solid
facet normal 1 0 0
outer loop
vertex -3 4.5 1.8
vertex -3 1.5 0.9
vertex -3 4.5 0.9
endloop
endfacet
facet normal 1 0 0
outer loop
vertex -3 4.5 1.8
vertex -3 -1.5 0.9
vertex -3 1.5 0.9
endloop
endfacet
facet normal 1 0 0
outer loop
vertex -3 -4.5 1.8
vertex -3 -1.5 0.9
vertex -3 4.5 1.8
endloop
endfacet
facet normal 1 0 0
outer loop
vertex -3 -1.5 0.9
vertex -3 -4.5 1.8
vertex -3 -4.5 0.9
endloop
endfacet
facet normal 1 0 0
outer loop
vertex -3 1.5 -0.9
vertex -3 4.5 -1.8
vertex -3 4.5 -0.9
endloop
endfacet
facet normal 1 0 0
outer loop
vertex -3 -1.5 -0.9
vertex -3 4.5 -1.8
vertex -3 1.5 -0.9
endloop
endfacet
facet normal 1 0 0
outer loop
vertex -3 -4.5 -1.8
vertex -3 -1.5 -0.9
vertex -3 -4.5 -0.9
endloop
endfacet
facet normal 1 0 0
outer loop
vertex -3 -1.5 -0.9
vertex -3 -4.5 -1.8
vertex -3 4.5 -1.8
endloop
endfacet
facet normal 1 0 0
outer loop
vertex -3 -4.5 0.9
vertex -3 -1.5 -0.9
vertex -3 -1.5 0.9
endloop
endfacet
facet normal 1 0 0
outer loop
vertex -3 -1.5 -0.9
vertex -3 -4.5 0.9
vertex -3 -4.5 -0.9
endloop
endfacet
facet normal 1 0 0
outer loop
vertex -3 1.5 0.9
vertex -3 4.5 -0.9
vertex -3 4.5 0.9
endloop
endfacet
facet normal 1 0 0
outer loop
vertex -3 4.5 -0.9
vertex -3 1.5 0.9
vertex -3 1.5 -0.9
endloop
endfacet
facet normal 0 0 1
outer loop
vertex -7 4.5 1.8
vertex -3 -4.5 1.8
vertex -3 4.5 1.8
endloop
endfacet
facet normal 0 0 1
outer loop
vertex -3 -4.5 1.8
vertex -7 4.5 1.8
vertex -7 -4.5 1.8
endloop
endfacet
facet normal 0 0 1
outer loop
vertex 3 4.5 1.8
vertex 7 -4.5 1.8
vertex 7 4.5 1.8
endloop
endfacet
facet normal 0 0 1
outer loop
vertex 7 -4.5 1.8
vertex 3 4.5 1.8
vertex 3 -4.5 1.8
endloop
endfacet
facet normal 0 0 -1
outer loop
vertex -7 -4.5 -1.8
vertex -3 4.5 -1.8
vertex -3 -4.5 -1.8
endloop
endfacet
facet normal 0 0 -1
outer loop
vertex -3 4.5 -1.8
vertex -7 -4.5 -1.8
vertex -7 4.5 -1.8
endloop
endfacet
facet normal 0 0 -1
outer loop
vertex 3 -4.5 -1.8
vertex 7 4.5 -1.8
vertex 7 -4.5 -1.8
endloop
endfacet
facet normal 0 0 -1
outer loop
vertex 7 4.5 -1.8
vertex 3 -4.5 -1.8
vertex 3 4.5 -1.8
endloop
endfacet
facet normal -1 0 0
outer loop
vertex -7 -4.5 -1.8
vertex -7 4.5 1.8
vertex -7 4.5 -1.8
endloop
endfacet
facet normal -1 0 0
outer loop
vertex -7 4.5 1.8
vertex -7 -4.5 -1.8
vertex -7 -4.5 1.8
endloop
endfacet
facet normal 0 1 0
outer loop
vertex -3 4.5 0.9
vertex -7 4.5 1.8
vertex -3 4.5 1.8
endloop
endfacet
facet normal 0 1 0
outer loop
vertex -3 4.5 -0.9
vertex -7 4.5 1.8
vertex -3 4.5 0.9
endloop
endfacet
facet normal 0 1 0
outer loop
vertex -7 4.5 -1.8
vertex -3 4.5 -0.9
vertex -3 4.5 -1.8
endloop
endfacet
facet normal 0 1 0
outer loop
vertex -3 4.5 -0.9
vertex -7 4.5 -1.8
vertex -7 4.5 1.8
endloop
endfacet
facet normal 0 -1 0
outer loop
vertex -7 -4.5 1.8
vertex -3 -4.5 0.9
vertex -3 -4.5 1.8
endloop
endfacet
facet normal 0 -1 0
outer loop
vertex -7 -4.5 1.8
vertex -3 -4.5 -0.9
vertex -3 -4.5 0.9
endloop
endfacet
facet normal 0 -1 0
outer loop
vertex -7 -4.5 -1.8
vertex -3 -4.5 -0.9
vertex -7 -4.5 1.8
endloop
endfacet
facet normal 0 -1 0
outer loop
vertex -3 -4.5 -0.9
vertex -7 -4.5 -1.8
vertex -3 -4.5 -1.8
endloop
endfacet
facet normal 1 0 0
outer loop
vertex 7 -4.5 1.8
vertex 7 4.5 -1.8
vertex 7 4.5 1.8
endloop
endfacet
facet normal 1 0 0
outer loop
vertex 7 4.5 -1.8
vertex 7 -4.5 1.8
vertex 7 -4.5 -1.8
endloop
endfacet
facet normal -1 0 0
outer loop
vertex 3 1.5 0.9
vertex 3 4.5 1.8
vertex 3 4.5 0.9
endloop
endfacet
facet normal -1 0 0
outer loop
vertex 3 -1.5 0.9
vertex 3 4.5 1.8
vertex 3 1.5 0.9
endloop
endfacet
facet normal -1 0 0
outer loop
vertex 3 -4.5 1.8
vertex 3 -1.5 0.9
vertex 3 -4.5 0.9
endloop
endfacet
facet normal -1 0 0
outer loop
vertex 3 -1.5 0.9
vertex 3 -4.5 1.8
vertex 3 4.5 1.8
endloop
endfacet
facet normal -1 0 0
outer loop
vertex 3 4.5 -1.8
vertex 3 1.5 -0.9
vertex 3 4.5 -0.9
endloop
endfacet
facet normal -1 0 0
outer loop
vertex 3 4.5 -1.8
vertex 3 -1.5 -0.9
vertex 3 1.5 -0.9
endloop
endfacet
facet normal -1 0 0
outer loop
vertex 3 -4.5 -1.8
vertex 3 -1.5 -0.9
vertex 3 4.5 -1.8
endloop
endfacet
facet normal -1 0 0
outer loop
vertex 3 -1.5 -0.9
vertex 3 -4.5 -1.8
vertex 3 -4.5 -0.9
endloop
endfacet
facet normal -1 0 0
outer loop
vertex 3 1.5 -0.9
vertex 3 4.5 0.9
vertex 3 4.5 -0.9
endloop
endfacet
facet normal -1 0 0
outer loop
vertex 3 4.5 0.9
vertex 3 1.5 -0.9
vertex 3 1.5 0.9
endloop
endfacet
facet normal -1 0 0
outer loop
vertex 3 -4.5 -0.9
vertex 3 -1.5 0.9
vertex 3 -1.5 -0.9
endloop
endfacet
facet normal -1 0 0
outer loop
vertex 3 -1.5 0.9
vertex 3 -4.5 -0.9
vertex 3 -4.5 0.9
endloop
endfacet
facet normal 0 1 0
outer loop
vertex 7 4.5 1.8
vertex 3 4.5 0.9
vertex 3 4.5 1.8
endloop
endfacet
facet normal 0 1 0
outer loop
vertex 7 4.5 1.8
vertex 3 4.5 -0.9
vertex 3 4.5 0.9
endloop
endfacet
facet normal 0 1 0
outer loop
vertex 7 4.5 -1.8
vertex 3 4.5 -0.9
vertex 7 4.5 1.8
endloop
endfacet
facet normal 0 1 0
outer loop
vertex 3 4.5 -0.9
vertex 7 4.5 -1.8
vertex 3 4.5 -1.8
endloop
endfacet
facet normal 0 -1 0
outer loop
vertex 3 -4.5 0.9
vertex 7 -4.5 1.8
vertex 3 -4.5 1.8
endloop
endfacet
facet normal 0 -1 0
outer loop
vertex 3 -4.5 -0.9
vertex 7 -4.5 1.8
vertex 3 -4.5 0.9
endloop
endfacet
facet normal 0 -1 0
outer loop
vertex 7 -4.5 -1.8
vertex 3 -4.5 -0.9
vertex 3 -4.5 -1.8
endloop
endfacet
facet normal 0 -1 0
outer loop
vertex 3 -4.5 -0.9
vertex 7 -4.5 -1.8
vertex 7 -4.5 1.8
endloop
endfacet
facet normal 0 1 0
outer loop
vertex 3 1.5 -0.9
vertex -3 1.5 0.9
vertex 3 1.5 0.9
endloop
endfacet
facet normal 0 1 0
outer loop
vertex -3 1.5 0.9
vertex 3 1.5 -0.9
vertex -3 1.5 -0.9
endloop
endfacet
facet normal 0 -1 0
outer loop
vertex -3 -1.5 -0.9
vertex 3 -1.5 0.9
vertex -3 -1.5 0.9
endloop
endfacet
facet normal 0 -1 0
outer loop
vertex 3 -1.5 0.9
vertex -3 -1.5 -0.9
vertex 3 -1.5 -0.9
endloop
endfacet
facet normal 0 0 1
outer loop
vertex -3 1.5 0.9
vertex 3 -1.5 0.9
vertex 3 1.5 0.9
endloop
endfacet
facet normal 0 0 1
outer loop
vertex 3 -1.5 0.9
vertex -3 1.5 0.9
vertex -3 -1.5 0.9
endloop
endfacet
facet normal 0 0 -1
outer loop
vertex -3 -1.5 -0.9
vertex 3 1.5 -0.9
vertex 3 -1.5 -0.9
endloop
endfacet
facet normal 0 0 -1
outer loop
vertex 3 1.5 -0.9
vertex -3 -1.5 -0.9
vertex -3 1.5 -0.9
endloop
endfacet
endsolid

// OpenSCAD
module h_shape_connector() {
    difference() {
        union() {
            // Left block
            translate([-7, -4.5, -1.8])
                cube([4, 9, 3.6]);
            // Right block
            translate([3, -4.5, -1.8])
                cube([4, 9, 3.6]);
            // Central web
            translate([-3, -1.5, -1.8])
                cube([6, 3, 3.6]);
        }
        // Top notch
        translate([-3, -4.5, 0.9])
            cube([6, 9, 0.9]);
        // Bottom notch
        translate([-3, -4.5, -1.8])
            cube([6, 9, 0.9]);
    }
}

h_shape_connector();
